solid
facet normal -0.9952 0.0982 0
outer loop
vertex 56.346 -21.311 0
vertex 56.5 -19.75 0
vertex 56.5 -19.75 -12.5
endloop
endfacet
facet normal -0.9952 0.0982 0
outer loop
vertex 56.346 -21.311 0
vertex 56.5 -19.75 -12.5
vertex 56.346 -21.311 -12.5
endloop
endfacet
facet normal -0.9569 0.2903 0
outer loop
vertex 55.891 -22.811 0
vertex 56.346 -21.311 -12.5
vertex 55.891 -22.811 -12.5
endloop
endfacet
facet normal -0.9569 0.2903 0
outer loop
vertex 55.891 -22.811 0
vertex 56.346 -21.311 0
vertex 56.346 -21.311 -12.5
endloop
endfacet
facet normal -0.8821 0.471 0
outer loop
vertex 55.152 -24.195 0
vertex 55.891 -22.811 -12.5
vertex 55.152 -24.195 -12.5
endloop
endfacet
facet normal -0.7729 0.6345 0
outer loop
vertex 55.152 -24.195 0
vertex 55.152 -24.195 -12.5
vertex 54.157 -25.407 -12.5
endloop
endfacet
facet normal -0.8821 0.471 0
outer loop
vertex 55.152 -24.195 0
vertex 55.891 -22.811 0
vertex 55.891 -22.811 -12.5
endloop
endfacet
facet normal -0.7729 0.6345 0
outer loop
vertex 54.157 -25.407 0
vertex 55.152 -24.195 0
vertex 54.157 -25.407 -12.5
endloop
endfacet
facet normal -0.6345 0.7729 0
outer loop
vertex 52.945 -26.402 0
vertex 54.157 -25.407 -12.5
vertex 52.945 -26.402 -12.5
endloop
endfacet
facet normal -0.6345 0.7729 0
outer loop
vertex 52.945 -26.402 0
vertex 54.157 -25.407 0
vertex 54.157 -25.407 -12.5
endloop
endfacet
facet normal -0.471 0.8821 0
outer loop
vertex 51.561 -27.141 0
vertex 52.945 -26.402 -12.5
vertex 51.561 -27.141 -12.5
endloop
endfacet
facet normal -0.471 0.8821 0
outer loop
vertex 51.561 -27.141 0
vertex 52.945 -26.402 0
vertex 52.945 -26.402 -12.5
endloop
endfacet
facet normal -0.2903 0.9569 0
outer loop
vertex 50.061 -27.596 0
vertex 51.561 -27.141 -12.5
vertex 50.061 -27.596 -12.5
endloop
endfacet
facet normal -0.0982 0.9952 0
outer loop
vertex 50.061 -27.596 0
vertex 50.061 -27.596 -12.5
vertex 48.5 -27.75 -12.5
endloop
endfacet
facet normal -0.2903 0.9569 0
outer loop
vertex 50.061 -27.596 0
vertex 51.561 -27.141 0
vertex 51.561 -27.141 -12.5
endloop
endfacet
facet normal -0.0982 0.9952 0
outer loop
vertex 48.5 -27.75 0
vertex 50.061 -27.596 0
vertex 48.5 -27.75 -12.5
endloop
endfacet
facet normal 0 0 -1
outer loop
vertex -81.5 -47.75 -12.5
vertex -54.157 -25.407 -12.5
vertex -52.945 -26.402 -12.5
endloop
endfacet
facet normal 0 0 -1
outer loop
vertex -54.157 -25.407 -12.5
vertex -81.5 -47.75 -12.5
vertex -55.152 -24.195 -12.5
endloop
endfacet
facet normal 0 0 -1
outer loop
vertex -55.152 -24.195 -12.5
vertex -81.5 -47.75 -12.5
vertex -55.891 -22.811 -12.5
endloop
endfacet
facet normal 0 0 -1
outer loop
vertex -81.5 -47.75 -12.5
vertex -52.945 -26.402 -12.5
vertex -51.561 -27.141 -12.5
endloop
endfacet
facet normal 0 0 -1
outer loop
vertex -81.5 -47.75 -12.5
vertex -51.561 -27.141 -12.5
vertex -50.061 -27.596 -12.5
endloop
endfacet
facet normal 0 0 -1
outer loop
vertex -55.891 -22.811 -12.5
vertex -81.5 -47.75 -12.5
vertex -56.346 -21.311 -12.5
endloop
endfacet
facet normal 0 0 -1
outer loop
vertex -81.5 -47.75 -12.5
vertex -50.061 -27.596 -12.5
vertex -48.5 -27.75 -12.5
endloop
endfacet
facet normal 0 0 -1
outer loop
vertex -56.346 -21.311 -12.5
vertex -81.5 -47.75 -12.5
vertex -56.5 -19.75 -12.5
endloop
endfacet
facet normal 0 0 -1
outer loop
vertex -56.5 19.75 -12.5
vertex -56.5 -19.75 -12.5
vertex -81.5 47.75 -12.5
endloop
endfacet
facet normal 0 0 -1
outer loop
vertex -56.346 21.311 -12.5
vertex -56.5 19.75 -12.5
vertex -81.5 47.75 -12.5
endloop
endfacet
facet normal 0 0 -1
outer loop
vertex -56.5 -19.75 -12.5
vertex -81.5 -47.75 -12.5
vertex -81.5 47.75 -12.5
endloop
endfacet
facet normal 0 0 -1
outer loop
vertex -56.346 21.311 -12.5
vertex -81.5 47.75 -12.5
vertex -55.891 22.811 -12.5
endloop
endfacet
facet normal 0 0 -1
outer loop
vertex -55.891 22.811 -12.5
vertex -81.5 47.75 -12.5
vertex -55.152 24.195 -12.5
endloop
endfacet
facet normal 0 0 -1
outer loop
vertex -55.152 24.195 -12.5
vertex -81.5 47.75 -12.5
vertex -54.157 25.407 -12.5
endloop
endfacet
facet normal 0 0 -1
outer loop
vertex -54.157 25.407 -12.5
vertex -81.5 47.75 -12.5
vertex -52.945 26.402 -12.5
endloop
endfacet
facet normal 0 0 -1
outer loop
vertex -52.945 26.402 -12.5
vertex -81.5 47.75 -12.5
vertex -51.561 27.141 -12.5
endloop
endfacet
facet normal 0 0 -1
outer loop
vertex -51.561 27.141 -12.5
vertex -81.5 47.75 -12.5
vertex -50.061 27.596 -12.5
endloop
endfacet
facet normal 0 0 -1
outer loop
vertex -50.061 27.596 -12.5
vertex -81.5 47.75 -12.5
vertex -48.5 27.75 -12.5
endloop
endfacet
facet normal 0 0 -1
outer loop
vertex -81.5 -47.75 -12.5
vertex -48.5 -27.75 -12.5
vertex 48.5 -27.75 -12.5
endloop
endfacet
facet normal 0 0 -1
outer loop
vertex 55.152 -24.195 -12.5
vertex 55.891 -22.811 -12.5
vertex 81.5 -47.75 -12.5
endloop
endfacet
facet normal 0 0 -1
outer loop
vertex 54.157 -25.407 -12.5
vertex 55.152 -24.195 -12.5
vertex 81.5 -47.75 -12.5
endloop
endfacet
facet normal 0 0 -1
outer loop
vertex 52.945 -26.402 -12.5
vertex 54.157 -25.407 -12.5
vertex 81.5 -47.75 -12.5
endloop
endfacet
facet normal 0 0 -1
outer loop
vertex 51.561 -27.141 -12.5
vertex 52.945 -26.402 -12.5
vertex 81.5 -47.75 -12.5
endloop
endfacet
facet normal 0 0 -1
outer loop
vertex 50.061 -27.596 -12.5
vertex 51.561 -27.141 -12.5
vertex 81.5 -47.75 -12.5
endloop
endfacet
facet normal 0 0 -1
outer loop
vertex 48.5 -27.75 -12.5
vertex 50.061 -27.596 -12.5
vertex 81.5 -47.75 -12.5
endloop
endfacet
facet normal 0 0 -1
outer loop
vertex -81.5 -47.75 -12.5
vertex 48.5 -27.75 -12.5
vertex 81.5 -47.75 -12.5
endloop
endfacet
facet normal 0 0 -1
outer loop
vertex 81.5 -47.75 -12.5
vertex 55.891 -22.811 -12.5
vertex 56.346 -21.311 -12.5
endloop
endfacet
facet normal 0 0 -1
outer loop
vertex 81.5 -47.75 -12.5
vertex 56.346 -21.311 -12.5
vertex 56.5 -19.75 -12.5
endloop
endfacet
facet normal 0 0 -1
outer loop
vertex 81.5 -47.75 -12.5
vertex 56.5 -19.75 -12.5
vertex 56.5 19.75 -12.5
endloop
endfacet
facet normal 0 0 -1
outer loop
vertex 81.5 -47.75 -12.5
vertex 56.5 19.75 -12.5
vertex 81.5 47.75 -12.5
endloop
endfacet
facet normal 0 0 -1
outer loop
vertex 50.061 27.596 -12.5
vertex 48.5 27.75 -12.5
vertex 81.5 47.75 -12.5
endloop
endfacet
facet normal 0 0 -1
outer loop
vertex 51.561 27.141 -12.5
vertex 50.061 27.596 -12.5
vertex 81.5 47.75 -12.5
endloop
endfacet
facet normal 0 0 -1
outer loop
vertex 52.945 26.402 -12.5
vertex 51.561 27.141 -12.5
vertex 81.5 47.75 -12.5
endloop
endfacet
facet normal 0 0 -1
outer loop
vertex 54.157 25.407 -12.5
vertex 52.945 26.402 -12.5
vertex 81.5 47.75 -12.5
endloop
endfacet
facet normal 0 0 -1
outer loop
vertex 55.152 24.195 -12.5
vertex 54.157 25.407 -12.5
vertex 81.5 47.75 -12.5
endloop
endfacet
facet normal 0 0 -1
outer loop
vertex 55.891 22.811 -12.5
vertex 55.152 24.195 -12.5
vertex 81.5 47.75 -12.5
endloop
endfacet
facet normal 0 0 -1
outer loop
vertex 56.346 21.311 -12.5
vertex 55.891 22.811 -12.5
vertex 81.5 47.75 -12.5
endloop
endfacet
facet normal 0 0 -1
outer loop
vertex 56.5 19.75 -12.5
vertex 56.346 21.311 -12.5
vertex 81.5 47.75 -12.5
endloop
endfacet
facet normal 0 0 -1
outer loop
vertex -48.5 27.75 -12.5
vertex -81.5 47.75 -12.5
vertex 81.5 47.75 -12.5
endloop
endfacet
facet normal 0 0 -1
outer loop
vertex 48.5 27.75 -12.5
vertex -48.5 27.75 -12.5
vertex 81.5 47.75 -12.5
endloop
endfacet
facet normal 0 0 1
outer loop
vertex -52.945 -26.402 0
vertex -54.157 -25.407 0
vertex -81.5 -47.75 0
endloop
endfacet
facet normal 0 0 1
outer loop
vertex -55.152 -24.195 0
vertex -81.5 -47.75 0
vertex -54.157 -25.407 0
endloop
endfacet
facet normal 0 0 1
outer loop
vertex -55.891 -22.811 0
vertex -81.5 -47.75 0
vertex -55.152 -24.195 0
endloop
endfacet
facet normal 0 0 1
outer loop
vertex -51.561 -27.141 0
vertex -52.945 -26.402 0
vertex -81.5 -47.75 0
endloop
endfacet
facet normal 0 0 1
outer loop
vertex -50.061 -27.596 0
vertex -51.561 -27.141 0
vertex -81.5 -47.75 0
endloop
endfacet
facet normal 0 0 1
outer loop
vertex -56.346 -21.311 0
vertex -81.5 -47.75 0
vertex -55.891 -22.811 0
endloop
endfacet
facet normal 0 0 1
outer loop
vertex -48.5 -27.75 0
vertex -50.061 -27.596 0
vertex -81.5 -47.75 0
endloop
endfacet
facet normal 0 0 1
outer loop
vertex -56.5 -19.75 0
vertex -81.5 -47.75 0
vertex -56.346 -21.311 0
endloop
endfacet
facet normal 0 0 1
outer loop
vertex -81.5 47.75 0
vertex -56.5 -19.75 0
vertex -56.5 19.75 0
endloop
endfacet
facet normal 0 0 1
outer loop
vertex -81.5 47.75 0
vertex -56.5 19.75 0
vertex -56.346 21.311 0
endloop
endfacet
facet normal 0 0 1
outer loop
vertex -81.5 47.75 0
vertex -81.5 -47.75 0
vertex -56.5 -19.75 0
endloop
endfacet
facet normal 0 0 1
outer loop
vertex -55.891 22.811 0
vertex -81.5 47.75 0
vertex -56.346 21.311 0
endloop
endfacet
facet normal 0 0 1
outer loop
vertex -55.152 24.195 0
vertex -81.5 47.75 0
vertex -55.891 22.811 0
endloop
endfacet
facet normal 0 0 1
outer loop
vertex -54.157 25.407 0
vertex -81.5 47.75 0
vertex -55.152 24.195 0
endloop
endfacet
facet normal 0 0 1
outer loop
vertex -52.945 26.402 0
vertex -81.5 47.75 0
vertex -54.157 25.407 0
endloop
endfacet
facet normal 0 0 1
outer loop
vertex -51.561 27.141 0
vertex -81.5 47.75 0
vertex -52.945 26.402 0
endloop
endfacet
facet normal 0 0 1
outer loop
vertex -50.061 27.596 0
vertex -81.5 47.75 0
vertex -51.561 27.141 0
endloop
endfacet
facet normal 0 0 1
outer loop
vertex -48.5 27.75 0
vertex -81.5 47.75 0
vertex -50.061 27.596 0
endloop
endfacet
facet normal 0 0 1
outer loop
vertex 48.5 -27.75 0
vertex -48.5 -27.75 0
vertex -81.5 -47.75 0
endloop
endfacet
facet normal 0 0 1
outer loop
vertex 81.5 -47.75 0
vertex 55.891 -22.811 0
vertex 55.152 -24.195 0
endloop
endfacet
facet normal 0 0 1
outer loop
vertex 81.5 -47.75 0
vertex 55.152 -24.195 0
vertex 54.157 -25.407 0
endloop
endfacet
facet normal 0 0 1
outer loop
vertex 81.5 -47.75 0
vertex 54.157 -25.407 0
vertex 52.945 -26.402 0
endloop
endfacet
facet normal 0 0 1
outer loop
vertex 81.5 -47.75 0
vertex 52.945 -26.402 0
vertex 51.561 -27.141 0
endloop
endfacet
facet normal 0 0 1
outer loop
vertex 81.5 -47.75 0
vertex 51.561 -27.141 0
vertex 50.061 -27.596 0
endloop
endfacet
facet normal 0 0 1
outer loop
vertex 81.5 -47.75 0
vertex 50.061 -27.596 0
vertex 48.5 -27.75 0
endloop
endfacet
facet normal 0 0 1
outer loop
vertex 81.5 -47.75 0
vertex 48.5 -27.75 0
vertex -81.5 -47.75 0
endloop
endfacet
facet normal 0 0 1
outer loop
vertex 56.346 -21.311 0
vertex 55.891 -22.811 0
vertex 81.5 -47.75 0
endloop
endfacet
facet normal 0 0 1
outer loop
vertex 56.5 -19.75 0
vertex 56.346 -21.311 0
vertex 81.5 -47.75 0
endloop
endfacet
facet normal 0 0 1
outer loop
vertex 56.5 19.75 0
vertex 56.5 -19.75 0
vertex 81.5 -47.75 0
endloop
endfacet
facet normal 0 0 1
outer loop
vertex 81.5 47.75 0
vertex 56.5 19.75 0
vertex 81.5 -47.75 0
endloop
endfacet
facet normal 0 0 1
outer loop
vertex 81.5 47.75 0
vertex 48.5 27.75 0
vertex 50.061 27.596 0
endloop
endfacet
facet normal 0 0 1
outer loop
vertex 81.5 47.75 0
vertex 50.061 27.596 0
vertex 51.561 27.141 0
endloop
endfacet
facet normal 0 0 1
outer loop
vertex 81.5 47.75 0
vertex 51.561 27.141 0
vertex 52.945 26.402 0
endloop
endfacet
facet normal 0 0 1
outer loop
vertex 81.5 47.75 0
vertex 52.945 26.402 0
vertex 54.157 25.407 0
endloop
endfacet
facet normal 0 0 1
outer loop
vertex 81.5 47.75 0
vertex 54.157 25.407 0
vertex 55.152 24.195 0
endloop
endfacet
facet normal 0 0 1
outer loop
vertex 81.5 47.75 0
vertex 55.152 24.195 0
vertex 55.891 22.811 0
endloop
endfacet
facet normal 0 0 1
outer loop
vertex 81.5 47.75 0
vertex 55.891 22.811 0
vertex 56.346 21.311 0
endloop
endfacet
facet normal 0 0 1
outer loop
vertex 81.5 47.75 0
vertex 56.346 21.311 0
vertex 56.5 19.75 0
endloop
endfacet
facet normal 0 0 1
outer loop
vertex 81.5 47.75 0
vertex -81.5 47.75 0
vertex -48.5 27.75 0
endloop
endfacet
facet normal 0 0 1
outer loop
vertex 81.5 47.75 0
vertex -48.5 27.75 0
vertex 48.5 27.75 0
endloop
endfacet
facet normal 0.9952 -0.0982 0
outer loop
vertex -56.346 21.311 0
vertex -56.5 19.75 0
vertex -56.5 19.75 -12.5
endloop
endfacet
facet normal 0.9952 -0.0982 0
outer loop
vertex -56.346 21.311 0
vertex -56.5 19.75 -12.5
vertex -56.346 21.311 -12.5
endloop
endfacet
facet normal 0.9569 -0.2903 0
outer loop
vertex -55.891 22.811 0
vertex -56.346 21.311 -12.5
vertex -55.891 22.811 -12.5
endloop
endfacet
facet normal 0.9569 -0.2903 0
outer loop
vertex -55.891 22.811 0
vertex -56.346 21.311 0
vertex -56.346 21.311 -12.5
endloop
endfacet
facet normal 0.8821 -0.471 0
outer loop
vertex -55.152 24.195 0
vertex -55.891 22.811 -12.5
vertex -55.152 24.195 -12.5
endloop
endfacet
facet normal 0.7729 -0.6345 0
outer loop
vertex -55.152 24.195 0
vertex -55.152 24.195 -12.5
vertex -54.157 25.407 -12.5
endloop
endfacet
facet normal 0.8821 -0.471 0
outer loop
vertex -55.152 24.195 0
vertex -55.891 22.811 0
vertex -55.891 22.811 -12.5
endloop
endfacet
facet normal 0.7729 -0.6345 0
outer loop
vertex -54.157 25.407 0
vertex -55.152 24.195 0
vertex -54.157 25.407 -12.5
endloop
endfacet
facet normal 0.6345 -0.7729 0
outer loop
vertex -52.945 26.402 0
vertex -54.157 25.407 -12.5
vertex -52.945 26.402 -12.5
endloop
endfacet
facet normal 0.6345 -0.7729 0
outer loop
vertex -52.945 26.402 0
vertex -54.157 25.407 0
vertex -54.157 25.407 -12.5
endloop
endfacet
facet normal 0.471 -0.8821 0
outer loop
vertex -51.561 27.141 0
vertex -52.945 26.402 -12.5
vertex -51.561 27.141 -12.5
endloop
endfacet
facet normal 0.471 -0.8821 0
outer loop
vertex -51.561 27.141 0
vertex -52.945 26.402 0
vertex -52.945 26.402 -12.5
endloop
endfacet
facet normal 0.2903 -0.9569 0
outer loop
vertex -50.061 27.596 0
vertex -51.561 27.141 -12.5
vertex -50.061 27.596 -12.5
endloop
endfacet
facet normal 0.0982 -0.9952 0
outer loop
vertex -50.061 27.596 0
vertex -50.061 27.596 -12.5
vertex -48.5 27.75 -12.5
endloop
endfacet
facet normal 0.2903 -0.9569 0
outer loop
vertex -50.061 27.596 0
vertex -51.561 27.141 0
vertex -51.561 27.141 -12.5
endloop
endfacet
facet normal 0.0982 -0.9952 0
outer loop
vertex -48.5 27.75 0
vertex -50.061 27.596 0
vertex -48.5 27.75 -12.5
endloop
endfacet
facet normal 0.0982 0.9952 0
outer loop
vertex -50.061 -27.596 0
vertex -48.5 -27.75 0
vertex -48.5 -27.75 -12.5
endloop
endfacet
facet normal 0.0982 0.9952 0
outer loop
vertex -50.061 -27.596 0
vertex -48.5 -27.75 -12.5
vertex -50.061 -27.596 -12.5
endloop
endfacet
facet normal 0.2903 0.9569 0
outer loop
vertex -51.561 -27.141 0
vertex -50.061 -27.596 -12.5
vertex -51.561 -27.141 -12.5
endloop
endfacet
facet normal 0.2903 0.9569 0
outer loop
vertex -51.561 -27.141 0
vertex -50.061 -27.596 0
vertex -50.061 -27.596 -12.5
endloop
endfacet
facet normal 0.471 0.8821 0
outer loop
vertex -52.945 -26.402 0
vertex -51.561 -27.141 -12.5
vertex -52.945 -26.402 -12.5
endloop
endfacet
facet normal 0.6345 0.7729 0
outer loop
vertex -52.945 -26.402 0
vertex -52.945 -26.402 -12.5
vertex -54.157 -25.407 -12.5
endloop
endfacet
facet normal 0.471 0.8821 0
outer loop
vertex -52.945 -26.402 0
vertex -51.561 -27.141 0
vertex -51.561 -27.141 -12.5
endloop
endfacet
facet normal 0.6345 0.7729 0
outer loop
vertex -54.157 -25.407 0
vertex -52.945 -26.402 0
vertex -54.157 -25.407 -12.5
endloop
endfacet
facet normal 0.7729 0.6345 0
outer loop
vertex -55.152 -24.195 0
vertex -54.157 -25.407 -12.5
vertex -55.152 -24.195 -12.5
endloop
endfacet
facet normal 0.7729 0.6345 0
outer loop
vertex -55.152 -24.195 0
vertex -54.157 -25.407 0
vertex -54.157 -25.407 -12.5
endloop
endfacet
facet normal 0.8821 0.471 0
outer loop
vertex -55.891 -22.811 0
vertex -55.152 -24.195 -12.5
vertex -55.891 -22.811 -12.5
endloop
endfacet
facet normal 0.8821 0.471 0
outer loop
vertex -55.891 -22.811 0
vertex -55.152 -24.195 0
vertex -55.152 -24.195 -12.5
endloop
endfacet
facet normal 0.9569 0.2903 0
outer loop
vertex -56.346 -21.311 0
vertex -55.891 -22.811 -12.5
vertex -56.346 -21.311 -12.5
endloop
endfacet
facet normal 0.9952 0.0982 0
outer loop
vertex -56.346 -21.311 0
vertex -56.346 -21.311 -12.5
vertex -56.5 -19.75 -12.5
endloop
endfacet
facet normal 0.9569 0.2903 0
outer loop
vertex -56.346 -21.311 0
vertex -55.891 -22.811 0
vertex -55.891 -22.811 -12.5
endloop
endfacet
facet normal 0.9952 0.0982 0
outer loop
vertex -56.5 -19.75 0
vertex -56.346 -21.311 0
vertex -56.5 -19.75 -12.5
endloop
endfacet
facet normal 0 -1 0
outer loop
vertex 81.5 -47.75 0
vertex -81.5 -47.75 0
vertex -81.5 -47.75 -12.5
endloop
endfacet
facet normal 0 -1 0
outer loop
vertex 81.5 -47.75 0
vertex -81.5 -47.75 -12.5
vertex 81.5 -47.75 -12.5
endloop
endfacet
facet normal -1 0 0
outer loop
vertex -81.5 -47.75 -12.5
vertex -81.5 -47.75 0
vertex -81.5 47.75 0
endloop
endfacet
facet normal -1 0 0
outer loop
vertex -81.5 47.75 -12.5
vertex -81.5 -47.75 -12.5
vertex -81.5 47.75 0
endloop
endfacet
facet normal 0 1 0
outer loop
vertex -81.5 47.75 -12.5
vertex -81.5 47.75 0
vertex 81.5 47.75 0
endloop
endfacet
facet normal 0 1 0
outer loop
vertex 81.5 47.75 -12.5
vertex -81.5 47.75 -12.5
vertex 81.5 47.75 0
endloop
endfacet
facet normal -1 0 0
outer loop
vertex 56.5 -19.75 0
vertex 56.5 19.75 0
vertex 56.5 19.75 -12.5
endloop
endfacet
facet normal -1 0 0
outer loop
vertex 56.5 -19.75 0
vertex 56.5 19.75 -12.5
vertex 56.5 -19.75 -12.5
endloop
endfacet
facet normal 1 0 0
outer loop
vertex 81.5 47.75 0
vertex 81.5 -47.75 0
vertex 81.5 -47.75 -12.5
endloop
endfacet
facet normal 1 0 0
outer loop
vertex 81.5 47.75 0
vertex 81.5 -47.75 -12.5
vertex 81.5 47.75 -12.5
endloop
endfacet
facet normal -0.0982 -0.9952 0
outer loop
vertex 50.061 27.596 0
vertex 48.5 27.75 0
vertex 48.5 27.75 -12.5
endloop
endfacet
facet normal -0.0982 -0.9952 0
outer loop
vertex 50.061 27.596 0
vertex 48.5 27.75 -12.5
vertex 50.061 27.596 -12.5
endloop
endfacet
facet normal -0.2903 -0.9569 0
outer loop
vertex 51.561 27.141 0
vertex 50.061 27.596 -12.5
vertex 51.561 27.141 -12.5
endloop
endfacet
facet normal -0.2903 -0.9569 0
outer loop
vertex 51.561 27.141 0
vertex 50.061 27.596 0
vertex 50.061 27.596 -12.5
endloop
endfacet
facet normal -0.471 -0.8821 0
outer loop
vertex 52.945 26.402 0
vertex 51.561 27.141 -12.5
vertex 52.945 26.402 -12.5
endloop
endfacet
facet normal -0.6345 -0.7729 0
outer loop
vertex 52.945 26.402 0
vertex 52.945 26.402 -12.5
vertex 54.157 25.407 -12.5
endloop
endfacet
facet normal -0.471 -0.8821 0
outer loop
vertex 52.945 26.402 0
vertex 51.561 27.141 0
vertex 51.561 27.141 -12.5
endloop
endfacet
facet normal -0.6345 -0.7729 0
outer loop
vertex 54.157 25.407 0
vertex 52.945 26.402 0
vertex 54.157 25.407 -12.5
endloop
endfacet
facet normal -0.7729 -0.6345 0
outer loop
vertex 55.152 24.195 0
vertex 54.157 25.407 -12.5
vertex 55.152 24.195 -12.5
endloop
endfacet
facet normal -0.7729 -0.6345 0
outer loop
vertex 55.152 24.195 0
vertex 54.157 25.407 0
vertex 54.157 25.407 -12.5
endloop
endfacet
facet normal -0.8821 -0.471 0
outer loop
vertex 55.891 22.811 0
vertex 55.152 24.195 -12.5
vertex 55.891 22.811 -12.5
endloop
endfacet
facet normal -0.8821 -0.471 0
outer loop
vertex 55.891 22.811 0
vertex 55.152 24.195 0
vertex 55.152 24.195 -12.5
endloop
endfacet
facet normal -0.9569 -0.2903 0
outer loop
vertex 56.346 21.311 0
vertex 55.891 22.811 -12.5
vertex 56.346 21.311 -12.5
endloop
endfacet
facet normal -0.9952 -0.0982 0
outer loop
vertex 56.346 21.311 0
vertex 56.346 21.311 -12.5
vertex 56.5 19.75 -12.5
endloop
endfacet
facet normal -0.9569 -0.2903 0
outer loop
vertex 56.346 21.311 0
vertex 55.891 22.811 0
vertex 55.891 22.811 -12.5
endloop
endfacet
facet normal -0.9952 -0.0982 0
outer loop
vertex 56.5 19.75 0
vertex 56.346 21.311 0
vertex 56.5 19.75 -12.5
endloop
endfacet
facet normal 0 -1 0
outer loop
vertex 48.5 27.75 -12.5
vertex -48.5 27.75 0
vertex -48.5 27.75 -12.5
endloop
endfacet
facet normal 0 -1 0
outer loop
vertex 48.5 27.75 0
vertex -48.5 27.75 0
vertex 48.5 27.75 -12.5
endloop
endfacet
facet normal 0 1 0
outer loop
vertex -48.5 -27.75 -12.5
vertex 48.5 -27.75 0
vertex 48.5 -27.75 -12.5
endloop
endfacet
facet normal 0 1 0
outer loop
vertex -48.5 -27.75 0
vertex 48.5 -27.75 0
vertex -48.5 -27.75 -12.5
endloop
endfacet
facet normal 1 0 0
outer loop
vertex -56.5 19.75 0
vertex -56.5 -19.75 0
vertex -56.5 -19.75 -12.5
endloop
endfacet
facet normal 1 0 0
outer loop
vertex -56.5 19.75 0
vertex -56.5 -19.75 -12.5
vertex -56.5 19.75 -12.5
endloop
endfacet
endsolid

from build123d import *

# Parameters (mm, degrees)
F1_W     = 163
F1_H     = 95.5
F2_DEPTH = 12.5


with BuildPart() as f2:
    # F1 (on Top) → F2 (new body)
    with BuildSketch(Plane.XY):
        Rectangle(F1_W, F1_H)
        with BuildLine():
            ThreePointArc((-56.5, 19.75), (-54.1568542495, 25.4068542495), (-48.5, 27.75))
            Line((-48.5, 27.75), (48.5, 27.75))
            ThreePointArc((48.5, 27.75), (54.1568542495, 25.4068542495), (56.5, 19.75))
            Line((56.5, 19.75), (56.5, -19.75))
            ThreePointArc((56.5, -19.75), (54.1568542495, -25.4068542495), (48.5, -27.75))
            Line((48.5, -27.75), (-48.5, -27.75))
            ThreePointArc((-48.5, -27.75), (-54.1568542495, -25.4068542495), (-56.5, -19.75))
            Line((-56.5, -19.75), (-56.5, 19.75))
        make_face(mode=Mode.SUBTRACT)
    extrude(amount=-F2_DEPTH)


solid = f2.part
